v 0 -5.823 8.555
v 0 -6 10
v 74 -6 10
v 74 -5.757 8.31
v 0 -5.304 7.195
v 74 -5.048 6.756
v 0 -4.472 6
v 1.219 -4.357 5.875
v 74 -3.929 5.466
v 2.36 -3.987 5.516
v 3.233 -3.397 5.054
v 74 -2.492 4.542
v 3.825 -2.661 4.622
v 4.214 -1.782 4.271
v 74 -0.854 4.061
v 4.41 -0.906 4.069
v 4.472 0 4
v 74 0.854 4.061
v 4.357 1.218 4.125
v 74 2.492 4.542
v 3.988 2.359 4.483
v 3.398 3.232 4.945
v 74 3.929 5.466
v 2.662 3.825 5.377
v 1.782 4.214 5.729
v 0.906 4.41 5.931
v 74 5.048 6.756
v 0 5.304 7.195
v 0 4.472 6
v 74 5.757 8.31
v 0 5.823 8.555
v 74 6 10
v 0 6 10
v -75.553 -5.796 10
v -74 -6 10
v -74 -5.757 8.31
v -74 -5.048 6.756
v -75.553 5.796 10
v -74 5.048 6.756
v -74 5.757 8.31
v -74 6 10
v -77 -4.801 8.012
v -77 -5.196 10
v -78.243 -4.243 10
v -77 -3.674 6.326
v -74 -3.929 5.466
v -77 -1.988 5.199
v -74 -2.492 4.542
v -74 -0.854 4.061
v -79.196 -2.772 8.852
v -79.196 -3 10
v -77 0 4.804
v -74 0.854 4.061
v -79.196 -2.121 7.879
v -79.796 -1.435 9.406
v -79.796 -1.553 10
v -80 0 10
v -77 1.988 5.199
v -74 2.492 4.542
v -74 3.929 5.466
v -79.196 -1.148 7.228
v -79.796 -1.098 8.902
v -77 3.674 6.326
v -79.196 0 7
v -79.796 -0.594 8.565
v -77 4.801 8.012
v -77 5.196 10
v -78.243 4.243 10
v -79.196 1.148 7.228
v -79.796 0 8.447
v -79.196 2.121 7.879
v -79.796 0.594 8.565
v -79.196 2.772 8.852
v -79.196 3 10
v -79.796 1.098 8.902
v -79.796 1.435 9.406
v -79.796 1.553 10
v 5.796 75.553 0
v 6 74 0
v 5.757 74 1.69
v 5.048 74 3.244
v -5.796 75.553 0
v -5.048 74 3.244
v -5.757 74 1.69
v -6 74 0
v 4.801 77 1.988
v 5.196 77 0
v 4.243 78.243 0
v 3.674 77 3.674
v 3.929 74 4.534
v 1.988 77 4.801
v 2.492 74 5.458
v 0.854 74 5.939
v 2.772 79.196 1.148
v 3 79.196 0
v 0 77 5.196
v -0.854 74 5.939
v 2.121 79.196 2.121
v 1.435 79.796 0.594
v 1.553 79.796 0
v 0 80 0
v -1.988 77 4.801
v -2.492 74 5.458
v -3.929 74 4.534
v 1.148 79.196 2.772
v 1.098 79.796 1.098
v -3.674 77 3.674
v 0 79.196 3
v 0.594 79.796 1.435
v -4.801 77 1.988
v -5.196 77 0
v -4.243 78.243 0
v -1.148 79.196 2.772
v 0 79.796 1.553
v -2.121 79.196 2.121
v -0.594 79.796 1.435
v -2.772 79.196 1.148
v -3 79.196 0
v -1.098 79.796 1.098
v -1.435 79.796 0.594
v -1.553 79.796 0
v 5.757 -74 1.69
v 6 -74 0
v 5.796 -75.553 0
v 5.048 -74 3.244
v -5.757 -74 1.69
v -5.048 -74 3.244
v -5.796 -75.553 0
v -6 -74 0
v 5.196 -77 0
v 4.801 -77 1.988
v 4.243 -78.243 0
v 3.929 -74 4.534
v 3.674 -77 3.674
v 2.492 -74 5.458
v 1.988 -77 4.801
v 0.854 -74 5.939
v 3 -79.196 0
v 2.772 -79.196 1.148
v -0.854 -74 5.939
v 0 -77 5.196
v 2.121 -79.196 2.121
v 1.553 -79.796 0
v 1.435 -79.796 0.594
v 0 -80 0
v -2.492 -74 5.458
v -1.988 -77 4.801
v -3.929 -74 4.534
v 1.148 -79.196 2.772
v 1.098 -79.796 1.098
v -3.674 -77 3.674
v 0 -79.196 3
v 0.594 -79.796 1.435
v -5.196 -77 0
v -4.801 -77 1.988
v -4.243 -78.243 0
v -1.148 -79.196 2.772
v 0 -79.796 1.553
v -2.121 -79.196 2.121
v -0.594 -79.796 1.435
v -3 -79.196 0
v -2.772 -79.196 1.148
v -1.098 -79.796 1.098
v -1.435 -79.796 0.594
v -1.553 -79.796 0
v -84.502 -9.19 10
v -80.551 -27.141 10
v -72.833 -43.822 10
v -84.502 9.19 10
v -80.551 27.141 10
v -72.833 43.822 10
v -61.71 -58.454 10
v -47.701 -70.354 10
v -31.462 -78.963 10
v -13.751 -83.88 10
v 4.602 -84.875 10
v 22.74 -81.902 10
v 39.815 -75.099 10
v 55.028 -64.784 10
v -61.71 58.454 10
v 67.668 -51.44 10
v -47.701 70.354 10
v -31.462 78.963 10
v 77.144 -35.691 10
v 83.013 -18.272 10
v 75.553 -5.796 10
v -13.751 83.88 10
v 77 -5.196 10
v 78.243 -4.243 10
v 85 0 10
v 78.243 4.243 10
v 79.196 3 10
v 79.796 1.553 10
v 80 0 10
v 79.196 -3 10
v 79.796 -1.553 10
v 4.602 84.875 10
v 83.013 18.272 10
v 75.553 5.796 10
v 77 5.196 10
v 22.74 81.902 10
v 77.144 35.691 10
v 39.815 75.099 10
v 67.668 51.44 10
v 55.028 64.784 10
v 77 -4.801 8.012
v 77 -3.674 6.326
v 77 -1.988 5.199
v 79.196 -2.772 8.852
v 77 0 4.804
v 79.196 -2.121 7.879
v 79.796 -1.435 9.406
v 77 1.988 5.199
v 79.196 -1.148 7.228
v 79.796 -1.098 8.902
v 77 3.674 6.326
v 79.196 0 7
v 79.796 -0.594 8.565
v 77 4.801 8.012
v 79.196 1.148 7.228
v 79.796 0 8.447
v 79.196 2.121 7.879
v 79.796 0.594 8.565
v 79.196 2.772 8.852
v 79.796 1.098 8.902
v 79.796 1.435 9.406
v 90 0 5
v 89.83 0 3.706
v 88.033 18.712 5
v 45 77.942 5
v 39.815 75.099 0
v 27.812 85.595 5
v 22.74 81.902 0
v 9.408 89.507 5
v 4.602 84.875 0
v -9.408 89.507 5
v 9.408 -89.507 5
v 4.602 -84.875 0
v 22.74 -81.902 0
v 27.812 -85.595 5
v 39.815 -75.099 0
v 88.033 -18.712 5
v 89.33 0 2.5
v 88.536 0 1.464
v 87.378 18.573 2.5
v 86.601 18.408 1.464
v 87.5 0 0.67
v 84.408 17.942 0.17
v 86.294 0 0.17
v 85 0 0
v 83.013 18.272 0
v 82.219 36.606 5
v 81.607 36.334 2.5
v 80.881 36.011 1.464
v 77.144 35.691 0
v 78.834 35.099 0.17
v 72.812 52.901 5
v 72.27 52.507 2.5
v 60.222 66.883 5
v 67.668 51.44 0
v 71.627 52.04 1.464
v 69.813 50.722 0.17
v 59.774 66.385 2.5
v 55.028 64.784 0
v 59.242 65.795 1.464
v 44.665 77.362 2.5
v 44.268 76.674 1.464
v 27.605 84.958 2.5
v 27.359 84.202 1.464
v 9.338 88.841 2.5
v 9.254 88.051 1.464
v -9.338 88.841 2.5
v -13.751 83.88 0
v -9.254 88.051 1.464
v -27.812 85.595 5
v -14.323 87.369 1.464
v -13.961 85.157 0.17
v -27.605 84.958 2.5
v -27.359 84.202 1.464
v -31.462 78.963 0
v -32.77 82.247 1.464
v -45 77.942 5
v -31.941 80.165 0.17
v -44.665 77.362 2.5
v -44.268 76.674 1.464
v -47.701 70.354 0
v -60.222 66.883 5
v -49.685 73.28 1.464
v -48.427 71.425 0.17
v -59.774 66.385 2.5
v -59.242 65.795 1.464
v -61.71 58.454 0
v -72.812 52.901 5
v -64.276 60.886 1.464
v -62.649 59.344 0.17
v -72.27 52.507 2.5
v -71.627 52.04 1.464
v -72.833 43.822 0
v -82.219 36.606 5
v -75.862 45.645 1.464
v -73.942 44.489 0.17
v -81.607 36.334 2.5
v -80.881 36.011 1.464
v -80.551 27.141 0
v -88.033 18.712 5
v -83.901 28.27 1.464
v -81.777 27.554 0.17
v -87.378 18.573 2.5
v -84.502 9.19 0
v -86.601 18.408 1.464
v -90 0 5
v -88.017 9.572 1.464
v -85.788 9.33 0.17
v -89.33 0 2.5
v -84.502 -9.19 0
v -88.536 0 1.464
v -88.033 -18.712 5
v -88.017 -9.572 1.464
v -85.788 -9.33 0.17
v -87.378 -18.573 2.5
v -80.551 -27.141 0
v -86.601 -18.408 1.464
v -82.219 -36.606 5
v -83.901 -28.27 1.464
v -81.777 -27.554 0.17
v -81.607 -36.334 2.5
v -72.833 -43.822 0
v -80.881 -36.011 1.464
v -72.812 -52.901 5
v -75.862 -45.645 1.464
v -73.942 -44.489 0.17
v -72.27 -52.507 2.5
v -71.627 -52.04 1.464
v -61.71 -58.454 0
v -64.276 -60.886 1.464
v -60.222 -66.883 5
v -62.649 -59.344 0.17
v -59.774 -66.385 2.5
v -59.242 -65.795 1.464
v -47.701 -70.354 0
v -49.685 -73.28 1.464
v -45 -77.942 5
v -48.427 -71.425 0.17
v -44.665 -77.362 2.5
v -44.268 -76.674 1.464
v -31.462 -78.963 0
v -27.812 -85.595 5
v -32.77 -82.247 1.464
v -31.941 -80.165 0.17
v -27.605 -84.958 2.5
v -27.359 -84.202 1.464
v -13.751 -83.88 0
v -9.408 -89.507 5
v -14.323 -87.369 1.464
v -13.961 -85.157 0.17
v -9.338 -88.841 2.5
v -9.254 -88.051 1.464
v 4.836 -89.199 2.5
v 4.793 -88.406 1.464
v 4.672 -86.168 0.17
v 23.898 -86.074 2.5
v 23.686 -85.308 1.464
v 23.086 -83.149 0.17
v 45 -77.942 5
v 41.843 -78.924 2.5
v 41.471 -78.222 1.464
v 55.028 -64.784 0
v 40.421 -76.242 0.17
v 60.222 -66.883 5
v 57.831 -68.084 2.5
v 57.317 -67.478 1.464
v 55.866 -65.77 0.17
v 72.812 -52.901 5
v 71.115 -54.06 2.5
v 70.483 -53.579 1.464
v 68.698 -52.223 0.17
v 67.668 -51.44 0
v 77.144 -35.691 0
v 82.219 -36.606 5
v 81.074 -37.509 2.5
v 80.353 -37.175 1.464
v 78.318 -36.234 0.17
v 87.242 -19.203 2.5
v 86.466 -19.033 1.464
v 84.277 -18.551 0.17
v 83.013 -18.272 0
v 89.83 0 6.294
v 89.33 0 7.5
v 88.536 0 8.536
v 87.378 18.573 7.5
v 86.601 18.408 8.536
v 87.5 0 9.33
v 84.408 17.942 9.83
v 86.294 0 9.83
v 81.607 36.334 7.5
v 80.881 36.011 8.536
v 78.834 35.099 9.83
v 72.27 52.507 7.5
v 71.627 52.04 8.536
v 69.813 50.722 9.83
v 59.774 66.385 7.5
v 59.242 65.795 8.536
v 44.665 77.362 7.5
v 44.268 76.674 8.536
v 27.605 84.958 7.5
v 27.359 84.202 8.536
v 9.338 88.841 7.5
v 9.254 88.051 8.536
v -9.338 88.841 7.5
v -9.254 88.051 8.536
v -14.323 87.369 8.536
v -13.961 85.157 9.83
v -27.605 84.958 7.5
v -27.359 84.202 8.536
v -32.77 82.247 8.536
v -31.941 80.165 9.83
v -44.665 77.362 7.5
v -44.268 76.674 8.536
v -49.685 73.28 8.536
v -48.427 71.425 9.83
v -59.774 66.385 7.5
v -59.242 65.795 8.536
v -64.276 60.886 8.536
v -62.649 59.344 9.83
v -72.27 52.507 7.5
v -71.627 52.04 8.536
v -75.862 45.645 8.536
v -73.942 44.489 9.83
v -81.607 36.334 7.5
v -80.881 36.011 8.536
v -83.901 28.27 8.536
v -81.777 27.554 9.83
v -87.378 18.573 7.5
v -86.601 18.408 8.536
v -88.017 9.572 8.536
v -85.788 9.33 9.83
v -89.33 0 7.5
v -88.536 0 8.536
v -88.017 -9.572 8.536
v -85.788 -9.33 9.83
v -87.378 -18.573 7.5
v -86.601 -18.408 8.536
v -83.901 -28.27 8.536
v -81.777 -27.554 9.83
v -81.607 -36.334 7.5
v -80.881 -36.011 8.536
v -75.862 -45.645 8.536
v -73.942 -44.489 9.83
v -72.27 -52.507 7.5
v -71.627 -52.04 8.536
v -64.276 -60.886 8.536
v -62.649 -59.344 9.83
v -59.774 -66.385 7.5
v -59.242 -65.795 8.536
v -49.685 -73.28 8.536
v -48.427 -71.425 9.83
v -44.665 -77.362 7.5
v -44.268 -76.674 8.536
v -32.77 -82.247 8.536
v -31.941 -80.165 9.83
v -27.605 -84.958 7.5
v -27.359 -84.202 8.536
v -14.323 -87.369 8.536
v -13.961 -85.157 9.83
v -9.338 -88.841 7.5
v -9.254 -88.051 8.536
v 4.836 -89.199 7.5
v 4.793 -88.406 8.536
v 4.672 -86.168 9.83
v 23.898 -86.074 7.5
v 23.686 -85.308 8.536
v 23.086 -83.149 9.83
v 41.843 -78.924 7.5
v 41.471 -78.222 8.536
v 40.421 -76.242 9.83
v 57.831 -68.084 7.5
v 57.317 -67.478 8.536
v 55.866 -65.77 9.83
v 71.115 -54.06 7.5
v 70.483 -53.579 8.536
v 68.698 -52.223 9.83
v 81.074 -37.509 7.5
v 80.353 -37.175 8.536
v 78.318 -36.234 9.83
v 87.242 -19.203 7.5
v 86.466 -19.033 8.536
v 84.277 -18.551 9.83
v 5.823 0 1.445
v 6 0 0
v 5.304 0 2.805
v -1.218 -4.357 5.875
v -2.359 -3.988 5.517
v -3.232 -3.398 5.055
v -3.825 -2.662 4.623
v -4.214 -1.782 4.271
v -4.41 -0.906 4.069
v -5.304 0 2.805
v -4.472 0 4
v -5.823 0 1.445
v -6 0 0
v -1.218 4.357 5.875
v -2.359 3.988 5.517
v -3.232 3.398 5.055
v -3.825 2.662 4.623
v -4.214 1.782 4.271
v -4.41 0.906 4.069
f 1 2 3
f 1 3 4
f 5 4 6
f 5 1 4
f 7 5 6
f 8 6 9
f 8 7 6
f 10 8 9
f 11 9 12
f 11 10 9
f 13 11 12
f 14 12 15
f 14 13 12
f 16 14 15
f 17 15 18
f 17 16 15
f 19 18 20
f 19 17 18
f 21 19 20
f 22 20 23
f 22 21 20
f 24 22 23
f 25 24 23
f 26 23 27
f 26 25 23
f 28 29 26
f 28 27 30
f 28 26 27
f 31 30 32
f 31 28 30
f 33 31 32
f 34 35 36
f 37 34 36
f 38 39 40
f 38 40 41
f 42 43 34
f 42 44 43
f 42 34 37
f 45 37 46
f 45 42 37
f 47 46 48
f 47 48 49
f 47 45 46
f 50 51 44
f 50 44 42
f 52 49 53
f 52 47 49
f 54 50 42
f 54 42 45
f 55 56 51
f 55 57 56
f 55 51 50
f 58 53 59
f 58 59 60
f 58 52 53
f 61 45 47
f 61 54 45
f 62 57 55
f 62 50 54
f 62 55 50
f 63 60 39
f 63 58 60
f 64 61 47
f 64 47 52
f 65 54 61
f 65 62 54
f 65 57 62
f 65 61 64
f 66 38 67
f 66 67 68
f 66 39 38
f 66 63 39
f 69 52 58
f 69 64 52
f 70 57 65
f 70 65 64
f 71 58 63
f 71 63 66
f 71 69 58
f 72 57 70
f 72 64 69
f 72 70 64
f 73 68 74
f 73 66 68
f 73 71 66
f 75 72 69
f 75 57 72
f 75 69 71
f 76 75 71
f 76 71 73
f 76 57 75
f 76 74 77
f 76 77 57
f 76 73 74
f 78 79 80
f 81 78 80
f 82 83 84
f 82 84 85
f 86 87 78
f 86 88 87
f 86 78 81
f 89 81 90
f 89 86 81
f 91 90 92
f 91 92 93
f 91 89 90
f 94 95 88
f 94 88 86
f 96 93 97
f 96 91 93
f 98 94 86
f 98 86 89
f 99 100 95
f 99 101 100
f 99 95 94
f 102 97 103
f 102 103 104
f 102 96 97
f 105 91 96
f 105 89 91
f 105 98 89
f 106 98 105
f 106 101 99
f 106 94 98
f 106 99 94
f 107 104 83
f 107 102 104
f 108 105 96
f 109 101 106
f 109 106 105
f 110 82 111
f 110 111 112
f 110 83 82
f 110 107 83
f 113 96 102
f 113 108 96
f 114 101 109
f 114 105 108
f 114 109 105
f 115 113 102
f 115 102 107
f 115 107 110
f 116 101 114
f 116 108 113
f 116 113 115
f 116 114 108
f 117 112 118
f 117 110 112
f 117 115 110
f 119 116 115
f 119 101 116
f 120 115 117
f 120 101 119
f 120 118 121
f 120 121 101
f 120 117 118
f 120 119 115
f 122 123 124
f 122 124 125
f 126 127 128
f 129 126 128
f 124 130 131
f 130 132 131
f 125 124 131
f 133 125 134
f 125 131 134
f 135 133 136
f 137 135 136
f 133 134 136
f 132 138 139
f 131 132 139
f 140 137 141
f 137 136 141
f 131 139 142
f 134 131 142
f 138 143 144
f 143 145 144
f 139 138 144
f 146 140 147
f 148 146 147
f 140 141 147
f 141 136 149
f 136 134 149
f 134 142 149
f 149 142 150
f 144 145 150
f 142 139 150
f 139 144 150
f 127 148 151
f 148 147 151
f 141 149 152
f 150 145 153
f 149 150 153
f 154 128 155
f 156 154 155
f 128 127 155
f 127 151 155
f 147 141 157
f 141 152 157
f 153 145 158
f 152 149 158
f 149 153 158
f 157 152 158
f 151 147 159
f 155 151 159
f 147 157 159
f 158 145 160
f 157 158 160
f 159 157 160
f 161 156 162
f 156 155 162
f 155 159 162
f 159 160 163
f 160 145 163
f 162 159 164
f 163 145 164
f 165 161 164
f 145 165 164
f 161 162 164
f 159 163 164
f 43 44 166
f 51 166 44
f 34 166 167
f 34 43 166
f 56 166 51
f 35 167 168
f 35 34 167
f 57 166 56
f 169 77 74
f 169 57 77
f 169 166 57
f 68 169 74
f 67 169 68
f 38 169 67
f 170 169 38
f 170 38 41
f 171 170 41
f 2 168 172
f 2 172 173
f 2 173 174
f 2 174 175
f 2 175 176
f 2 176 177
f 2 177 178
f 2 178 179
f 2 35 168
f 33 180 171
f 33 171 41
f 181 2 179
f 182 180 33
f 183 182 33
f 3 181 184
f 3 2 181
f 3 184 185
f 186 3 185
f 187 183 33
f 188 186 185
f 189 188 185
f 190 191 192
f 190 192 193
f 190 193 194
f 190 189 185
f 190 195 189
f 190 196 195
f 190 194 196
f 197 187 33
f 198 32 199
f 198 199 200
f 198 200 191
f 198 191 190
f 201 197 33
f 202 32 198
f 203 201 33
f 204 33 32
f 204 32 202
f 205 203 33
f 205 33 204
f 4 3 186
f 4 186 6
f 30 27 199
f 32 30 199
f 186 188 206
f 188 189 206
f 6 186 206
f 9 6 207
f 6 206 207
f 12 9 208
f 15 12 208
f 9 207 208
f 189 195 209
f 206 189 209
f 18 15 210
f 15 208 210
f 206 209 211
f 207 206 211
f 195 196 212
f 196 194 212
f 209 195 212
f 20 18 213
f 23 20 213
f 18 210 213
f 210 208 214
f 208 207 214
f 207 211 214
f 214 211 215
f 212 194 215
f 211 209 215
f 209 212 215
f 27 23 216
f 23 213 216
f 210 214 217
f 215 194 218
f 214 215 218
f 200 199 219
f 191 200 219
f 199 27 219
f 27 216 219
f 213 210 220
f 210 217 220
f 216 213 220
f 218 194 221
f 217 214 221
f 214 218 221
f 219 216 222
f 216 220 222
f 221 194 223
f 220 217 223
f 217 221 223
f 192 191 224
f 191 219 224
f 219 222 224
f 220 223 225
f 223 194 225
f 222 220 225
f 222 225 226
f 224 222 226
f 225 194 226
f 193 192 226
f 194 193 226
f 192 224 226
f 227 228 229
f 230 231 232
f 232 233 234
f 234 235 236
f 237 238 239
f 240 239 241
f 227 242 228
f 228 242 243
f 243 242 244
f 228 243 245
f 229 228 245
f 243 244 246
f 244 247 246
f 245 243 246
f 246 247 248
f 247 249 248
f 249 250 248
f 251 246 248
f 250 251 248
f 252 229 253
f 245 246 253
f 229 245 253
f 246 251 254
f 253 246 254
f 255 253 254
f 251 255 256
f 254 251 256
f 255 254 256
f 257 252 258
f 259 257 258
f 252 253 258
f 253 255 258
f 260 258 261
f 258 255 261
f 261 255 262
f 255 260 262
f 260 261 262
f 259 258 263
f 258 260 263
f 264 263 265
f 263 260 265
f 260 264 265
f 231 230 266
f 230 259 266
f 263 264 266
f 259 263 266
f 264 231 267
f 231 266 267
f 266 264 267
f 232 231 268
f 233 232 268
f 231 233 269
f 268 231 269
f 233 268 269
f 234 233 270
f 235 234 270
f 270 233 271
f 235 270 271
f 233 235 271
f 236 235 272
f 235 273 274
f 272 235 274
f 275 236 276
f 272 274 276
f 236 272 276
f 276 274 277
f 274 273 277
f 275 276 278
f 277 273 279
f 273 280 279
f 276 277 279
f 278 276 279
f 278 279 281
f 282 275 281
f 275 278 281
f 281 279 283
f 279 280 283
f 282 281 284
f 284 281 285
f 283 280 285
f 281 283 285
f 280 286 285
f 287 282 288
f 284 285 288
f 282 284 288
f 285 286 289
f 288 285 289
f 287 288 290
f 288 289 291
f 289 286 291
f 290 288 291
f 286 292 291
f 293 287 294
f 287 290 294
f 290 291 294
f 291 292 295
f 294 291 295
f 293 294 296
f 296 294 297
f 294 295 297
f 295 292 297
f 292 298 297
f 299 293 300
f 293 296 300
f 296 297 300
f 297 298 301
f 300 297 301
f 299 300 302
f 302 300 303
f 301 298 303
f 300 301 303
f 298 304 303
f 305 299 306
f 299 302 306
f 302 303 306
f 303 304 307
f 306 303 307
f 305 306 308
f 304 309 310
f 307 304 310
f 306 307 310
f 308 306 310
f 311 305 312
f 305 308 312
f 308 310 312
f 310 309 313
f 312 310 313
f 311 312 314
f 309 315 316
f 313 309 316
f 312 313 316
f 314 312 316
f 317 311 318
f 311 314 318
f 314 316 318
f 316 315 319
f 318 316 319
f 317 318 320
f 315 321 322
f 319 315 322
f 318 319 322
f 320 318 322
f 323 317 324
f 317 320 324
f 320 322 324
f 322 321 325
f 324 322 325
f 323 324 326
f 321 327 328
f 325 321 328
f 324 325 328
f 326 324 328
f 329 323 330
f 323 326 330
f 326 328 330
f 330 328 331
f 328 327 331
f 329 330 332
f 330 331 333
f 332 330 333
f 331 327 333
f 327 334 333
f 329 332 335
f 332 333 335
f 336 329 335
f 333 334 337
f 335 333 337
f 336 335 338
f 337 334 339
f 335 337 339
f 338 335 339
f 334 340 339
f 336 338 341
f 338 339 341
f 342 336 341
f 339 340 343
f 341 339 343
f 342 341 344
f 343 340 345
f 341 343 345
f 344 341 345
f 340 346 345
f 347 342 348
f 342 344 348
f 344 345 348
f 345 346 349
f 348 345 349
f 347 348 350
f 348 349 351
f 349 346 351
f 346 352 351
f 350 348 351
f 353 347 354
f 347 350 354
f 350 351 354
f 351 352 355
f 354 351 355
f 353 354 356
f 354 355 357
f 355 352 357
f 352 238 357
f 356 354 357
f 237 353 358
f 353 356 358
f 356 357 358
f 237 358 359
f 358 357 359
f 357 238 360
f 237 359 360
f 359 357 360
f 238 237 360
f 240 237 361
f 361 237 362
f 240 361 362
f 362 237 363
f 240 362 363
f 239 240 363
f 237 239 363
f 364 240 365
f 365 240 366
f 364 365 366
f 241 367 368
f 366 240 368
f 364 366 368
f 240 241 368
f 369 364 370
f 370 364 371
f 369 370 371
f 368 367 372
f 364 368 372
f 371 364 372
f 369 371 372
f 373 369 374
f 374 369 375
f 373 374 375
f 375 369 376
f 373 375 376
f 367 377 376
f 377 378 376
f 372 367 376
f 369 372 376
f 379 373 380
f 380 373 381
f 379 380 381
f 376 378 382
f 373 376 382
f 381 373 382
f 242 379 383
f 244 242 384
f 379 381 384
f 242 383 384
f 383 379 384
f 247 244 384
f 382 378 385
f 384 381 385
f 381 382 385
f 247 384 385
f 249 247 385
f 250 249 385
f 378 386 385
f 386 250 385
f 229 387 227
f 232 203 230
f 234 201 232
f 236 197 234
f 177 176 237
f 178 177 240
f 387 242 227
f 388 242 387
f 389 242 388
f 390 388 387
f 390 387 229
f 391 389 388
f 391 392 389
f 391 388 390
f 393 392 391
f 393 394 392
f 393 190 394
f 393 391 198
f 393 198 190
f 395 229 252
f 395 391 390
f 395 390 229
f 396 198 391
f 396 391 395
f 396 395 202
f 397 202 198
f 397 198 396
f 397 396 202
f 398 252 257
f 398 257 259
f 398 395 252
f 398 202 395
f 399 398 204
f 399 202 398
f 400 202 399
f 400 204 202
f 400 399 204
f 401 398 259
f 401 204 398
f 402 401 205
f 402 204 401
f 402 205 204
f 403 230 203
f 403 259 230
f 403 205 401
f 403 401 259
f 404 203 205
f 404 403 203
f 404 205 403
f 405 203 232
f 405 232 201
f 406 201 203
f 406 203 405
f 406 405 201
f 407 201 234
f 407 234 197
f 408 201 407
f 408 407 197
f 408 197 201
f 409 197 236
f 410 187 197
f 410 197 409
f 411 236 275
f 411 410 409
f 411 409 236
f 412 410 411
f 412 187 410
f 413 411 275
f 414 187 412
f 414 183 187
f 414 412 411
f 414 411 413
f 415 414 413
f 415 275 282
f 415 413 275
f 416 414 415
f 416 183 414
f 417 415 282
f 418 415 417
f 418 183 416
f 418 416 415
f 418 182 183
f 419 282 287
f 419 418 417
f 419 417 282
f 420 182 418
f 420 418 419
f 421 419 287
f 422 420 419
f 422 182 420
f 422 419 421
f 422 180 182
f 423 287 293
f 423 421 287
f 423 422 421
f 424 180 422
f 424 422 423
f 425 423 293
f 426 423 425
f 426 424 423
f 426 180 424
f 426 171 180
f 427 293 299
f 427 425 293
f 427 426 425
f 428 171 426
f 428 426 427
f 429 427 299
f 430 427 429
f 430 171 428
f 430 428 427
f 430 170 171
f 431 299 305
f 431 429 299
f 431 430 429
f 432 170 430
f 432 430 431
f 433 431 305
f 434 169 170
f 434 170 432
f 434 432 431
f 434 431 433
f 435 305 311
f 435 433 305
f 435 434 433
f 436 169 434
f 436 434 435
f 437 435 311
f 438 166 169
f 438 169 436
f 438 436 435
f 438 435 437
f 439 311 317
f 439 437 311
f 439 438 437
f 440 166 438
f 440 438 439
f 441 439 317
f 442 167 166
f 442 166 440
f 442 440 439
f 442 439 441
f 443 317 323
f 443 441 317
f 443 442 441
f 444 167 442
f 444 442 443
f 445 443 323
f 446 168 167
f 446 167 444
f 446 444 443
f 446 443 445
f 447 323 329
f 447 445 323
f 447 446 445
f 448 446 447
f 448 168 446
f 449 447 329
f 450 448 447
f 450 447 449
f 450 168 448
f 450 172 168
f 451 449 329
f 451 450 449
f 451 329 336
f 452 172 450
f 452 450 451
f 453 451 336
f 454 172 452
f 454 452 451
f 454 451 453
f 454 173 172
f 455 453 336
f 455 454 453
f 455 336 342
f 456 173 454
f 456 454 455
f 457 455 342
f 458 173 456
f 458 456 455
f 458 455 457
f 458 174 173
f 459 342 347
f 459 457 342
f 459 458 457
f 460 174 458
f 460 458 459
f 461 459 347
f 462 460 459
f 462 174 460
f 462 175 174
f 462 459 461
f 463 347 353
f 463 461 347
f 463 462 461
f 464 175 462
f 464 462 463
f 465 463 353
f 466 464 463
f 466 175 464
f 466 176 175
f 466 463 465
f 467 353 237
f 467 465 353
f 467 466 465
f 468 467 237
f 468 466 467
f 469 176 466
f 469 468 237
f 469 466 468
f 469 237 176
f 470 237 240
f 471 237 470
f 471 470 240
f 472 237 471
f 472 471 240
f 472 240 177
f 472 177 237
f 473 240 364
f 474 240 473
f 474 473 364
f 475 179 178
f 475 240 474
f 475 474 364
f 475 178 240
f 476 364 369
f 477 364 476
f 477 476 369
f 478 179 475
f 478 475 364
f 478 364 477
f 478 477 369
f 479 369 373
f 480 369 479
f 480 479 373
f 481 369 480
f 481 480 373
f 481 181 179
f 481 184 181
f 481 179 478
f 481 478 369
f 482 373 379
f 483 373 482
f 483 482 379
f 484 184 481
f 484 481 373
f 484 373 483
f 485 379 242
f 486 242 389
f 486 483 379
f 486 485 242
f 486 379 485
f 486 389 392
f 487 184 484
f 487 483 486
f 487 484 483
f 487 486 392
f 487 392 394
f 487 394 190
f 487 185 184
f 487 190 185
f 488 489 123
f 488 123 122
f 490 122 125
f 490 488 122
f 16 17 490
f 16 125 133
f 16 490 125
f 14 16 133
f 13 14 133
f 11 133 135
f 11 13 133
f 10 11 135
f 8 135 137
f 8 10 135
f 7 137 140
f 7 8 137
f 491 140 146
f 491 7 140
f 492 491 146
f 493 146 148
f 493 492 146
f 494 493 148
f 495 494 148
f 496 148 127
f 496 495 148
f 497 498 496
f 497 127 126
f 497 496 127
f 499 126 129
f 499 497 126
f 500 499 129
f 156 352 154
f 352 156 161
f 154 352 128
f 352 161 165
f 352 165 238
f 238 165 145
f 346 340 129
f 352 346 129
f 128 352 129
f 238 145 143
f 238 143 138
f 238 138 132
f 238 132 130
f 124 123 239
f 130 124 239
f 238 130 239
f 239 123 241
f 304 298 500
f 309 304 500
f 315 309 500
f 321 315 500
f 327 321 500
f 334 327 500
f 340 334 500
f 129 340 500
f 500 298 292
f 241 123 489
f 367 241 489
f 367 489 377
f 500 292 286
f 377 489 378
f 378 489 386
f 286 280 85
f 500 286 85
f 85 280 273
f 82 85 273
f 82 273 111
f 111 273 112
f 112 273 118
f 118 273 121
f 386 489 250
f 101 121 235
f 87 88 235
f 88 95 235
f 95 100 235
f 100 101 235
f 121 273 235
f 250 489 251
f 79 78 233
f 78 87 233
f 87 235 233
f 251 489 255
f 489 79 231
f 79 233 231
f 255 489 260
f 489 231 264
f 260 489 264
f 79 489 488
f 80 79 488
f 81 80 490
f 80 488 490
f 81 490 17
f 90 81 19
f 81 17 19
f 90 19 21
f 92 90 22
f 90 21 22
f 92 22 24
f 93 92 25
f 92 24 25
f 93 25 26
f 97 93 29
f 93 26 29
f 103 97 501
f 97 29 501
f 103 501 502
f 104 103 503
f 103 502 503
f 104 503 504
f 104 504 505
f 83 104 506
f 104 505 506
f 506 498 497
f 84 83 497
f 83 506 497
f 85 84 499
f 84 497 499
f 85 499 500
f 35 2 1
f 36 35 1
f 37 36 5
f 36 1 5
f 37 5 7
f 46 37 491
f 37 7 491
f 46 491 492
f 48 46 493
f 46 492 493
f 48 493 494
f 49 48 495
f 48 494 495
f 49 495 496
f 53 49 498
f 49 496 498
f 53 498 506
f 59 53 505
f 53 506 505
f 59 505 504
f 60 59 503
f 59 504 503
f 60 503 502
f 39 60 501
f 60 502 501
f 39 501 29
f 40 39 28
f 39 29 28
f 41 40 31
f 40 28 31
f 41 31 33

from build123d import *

# Parameters (mm, degrees)
F0_R          = 90
F1_DEPTH      = 10
F2_R          = 4.99999
F3_R          = 6
F4_DEPTH      = 80
F4_DEPTH_BACK = 80
F5_R          = 6
F6_DEPTH      = 80
F6_DEPTH_BACK = 80
F7_R          = 5.99999
F8_R          = 5.99999


# Not quite as in the source:
# - a fillet or chamfer is up to 0.001 mm smaller than in the source, because OpenCascade refuses the exact size


with BuildPart() as f1:
    # F0 (on Top) → F1 (new body)
    with BuildSketch(Plane.XY):
        Circle(F0_R)
    extrude(amount=F1_DEPTH)

    # F2 (radius 5 in the source; OpenCascade refuses exactly that, so slightly less here)
    f2_edges = [f1.edges().sort_by_distance(p)[0] for p in [
        (-90, 0, 10),
        (-90, 0, 0),
    ]]
    fillet(f2_edges, radius=F2_R)

    # F3 (on Front) → F4 (cut, two sides)
    with BuildSketch(Plane.XZ) as f4_sk:
        Circle(F3_R)
    extrude(amount=F4_DEPTH, mode=Mode.SUBTRACT)
    extrude(f4_sk.sketch, amount=-F4_DEPTH_BACK, mode=Mode.SUBTRACT)

    # F5 (on Right) → F6 (cut, two sides)
    with BuildSketch(Plane.YZ) as f6_sk:
        with Locations((0, 10)):
            Circle(F5_R)
    extrude(amount=-F6_DEPTH, mode=Mode.SUBTRACT)
    extrude(f6_sk.sketch, amount=F6_DEPTH_BACK, mode=Mode.SUBTRACT)

    # F7 (radius 6 in the source; OpenCascade refuses exactly that, so slightly less here)
    f7_edges = [f1.edges().sort_by_distance(p)[0] for p in [
        (80, 0, 4),
        (-80, 0, 4),
    ]]
    fillet(f7_edges, radius=F7_R)

    # F8 (radius 6 in the source; OpenCascade refuses exactly that, so slightly less here)
    f8_edges = [f1.edges().sort_by_distance(p)[0] for p in [
        (0, -80, 6),
        (0, 80, 6),
    ]]
    fillet(f8_edges, radius=F8_R)


solid = f1.part
